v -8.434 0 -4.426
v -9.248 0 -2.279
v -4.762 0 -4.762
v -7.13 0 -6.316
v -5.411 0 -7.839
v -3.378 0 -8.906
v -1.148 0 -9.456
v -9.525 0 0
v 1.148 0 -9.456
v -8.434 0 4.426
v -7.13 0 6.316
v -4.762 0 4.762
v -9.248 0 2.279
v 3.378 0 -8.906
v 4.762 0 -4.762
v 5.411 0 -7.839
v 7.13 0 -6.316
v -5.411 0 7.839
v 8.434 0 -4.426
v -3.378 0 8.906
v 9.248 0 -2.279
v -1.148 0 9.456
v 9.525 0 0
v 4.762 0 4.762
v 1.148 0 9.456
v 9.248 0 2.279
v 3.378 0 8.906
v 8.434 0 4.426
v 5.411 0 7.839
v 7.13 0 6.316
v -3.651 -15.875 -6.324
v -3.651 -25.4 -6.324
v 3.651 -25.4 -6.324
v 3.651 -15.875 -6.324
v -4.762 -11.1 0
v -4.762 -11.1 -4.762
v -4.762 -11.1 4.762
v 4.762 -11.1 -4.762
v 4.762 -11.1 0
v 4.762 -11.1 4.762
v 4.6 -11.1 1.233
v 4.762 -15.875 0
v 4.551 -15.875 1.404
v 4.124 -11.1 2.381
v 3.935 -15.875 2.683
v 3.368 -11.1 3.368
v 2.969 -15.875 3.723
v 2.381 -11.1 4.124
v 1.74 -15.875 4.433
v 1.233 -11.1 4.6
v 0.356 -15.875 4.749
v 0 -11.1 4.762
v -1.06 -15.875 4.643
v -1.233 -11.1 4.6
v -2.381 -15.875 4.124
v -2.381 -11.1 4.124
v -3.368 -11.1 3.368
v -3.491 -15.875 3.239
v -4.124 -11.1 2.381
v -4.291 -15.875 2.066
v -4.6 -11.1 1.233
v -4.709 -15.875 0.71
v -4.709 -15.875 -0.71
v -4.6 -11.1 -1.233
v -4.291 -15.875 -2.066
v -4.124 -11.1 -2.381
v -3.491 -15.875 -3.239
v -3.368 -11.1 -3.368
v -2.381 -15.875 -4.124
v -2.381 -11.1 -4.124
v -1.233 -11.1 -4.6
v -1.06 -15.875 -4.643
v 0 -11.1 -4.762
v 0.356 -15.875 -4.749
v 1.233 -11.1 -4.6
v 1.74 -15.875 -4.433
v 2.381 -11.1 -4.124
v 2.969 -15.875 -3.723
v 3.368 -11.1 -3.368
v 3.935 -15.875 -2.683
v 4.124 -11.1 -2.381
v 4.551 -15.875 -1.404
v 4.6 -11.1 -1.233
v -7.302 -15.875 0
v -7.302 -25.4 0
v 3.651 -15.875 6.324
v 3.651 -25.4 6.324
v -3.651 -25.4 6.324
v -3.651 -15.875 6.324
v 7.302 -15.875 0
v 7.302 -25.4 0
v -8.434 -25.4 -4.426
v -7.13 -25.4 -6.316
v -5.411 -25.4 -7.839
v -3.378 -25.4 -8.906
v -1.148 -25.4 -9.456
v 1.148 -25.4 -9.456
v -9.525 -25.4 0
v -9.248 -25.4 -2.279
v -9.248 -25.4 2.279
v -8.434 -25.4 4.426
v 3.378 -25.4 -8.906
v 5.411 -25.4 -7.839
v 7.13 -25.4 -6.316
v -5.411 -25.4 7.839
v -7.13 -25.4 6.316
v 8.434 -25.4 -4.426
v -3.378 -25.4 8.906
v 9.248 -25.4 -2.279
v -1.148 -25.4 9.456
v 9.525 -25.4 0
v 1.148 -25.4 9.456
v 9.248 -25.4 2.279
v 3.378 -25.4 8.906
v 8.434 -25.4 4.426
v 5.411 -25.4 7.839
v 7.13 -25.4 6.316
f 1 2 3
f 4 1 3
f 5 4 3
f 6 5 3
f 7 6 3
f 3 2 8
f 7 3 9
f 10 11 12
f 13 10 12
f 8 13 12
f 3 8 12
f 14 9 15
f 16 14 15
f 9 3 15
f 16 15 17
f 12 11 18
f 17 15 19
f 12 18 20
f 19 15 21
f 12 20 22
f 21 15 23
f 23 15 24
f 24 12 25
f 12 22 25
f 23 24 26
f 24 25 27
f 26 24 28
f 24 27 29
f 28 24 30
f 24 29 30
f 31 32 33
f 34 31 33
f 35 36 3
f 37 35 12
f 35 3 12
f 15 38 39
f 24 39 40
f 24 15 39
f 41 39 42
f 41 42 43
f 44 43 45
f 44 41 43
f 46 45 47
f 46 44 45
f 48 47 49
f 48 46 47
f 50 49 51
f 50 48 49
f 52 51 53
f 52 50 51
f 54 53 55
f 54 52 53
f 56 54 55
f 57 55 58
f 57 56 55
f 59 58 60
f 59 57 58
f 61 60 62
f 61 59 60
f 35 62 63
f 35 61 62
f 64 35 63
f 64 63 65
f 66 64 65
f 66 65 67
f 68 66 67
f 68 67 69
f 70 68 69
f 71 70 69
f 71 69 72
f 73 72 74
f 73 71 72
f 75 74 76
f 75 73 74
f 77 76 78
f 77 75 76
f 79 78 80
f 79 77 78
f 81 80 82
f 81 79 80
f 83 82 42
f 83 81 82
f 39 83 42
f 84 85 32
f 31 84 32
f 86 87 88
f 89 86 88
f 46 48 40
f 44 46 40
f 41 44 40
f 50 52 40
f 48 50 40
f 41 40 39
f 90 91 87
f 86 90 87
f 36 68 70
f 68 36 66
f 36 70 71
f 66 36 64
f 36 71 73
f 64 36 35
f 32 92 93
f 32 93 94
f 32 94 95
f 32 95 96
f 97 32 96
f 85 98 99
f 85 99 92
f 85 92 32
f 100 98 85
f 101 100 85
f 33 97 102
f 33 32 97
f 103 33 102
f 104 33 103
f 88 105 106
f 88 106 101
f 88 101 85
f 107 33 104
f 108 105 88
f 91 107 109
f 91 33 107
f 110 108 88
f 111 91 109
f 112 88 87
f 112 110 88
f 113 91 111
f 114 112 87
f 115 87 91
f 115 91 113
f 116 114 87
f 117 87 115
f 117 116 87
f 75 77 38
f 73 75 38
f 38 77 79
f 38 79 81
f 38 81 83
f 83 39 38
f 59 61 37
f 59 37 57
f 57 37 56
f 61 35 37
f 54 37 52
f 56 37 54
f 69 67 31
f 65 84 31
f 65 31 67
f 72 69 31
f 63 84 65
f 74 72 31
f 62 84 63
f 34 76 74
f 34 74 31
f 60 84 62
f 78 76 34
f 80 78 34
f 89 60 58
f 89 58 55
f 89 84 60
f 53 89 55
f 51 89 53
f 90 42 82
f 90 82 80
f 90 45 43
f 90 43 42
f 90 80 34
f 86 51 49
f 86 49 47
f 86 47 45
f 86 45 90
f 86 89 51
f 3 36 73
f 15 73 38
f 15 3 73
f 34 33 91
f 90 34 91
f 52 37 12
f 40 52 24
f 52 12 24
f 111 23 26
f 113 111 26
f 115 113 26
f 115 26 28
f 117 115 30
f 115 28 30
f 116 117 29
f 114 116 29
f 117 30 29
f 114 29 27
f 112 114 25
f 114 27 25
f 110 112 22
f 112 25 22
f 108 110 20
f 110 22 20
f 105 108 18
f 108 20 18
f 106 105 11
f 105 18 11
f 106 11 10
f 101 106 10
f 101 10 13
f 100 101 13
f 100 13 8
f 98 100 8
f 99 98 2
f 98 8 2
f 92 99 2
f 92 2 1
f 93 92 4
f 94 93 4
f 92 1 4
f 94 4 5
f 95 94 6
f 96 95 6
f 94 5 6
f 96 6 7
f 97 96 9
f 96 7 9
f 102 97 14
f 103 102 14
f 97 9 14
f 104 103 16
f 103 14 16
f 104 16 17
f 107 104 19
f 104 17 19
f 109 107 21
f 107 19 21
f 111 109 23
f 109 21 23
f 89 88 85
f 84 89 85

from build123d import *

# Parameters (mm, degrees)
F0_R     = 9.525
F1_DEPTH = 25.4
F3_R     = 4.7625
F4_DEPTH = 25.401
F2_W     = 9.525
F2_H     = 9.525
F5_DEPTH = 11.0998
F7_DEPTH = 9.525


with BuildPart() as f1:
    # F0 (on Front) → F1 (new body)
    with BuildSketch(Plane.XZ):
        Circle(F0_R)
    extrude(amount=F1_DEPTH)

    # F3 (on Front) → F4 (cut, through all)
    with BuildSketch(Plane.XZ):
        Circle(F3_R)
    extrude(amount=F4_DEPTH, mode=Mode.SUBTRACT)

    # F2 (on Front) → F5 (cut)
    with BuildSketch(Plane.XZ):
        Rectangle(F2_W, F2_H)
    extrude(amount=F5_DEPTH, mode=Mode.SUBTRACT)

    # F6 (on face) → F7 (cut)
    with BuildSketch(Plane.XZ.offset(25.4)):
        Polygon((3.65125, 6.324151), (-3.65125, 6.324151), (-7.3025, 0), (-3.65125, -6.324151), (3.65125, -6.324151), (7.3025, 0), align=None)
    extrude(amount=-F7_DEPTH, mode=Mode.SUBTRACT)


solid = f1.part
